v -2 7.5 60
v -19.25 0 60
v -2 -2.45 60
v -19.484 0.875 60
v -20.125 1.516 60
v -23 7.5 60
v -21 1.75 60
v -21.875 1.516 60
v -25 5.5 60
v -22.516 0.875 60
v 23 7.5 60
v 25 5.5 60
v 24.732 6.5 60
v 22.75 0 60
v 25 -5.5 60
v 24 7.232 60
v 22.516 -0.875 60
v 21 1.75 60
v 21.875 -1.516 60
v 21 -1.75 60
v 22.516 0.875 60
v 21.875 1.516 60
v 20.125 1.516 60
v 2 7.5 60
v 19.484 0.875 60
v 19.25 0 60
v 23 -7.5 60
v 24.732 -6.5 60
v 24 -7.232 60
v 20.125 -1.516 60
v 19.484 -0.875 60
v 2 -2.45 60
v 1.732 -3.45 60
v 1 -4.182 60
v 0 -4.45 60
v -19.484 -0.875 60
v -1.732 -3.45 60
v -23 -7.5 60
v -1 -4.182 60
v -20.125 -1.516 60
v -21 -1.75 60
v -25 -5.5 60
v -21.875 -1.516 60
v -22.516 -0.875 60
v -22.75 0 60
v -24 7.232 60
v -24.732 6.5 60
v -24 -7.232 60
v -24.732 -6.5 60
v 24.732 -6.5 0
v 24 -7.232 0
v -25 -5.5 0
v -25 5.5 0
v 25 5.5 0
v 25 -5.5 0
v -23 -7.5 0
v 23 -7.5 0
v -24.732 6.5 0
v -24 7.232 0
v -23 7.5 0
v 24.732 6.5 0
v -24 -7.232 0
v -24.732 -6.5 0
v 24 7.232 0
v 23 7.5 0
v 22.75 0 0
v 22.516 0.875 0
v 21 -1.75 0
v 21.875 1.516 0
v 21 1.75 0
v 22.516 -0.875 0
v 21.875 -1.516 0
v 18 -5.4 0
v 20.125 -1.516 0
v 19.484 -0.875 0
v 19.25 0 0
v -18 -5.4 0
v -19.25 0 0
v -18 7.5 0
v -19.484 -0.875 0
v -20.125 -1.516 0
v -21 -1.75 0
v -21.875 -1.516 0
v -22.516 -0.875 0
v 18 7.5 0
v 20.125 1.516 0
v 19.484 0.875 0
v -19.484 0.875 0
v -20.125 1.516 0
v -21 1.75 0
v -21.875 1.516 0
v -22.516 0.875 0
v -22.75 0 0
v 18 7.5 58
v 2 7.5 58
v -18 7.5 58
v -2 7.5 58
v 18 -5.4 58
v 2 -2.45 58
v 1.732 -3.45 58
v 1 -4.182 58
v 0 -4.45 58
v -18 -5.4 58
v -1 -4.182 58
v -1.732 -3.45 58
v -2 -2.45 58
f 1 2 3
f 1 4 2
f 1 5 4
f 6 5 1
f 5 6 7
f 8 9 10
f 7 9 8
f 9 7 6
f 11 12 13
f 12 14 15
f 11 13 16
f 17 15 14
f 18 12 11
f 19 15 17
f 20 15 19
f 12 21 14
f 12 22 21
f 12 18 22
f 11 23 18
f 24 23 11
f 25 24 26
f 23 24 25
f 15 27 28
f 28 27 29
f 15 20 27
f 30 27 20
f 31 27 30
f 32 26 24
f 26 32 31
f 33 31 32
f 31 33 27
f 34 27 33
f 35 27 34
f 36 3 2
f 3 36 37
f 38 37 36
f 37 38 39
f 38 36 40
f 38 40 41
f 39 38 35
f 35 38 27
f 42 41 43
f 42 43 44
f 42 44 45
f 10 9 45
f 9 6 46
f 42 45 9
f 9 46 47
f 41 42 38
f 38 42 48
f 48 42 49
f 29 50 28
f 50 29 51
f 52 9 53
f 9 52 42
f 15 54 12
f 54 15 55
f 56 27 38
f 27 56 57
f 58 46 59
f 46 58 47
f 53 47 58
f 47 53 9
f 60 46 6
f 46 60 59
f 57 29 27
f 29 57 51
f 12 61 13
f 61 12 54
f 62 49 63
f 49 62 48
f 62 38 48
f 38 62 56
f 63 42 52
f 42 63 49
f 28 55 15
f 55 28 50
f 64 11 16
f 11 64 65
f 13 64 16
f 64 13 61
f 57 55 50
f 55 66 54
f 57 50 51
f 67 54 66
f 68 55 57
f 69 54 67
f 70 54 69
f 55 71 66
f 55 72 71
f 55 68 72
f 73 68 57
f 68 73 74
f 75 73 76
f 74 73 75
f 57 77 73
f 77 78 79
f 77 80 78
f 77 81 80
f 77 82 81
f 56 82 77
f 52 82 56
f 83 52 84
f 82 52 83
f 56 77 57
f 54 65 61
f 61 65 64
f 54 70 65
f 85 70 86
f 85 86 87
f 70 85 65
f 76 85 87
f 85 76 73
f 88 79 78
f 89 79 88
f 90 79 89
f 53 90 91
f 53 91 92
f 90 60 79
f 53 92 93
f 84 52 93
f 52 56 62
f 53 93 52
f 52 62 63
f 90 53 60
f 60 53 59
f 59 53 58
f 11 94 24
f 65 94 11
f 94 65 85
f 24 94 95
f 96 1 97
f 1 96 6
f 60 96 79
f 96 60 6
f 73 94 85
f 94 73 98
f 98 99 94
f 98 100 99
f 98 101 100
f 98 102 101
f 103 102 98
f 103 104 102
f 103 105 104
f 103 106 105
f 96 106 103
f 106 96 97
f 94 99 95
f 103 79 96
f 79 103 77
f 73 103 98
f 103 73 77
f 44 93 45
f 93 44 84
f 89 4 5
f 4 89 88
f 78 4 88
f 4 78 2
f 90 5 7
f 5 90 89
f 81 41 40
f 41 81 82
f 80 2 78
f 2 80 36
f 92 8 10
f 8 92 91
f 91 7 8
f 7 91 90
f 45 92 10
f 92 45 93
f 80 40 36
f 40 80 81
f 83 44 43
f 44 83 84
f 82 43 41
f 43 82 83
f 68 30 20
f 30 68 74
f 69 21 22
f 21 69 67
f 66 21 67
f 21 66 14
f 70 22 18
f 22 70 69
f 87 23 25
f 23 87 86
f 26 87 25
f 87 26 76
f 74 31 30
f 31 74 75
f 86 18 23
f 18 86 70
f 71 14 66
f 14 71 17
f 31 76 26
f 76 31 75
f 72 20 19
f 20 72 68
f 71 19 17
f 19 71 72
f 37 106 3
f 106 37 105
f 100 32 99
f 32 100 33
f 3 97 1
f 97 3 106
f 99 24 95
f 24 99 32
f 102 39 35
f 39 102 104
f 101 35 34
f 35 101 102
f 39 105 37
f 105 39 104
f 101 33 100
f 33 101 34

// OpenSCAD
// file: ../OpenSCAD_Modules/cube_vround.scad
module cube_vround(
	size=[10,10,10],
	round_corners=[true,true,true,true],
	rounding=3,
	center_xy=false,
	center_z=false,
	attach=0,
	wall_attach=0,
	quality=2, //integer from 1 to infinity
)
{
	assert(len(size)==3);
	assert(len(round_corners)==4);
	assert(rounding>0);
	assert(rounding<=size[0]/2);
	assert(rounding<=size[1]/2);
	assert(quality>0);
	assert(attach>=0);
	assert(wall_attach>=0);
	height=size[2]+attach;
	cyl_r=rounding+wall_attach;
	cyl_mvx=size[0]/2-rounding;
	cyl_mvy=size[1]/2-rounding;
	cube_szx=size[0]/2;
	cube_szy=size[1]/2;
	cube_mvx=cube_szx/2+wall_attach;
	cube_mvy=cube_szy/2+wall_attach;
	translate([center_xy?0:cube_szx,center_xy?0:cube_szy,center_z?-attach/2:(size[2]-attach)/2])
		hull()
		{
			if(round_corners[0])
				translate([cyl_mvx,cyl_mvy])
					cylinder(r=cyl_r,h=height,$fn=12*quality,center=true);
			else
				translate([cube_mvx,cube_mvy])
					cube([cube_szx,cube_szy,height],center=true);
			if(round_corners[1])
				translate([cyl_mvx,-cyl_mvy])
					cylinder(r=cyl_r,h=height,$fn=12*quality,center=true);
			else
				translate([cube_mvx,-cube_mvy])
					cube([cube_szx,cube_szy,height],center=true);
			if(round_corners[2])
				translate([-cyl_mvx,-cyl_mvy])
					cylinder(r=cyl_r,h=height,$fn=12*quality,center=true);
			else
				translate([-cube_mvx,-cube_mvy])
					cube([cube_szx,cube_szy,height],center=true);
			if(round_corners[3])
				translate([-cyl_mvx,cyl_mvy])
					cylinder(r=cyl_r,h=height,$fn=12*quality,center=true);
			else
				translate([-cube_mvx,cube_mvy])
					cube([cube_szx,cube_szy,height],center=true);
		};
}

//example
cube_vround(round_corners=[true,false,true,false],
size=[10,20,6],
attach=0.1,
wall_attach=0.1,
rounding=3,
center_xy=true,center_z=false);
// main file
use <../OpenSCAD_Modules/cube_vround.scad>

module FanDriversHolder
(
	size=[50,15,60],
	cutSize=[36,13,58],
	holeSize=[4,12],
	screwDiam=3.5,
	screwDiff=42,
	quality=1,
)
{
	cutClr=0.1;
	length=size[0];
	width=size[1];
	height=size[2];
	difference()
	{
		cube_vround(size=[length,width,height],rounding=2,center_xy=true,quality=quality);
		//main cut
		translate([-cutSize[0]/2,(width-2*cutSize[1])/2+cutClr,-cutClr])
			cube(size=[cutSize[0],cutSize[1]+cutClr,cutSize[2]+cutClr]);
		//screw cuts
		translate([-screwDiff/2,0,-cutClr])
			cylinder(h=height+2*cutClr,d=screwDiam,$fn=quality*12);
		translate([screwDiff/2,0,-cutClr])
			cylinder(h=height+2*cutClr,d=screwDiam,$fn=quality*12);
		translate([0,(size[1]-holeSize[1])/2+cutClr,0])
			cube_vround(size=[holeSize[0],holeSize[1]+cutClr,height+cutClr],rounding=2,round_corners=[false,true,true,false],center_xy=true,quality=quality);
	}
}

FanDriversHolder();
